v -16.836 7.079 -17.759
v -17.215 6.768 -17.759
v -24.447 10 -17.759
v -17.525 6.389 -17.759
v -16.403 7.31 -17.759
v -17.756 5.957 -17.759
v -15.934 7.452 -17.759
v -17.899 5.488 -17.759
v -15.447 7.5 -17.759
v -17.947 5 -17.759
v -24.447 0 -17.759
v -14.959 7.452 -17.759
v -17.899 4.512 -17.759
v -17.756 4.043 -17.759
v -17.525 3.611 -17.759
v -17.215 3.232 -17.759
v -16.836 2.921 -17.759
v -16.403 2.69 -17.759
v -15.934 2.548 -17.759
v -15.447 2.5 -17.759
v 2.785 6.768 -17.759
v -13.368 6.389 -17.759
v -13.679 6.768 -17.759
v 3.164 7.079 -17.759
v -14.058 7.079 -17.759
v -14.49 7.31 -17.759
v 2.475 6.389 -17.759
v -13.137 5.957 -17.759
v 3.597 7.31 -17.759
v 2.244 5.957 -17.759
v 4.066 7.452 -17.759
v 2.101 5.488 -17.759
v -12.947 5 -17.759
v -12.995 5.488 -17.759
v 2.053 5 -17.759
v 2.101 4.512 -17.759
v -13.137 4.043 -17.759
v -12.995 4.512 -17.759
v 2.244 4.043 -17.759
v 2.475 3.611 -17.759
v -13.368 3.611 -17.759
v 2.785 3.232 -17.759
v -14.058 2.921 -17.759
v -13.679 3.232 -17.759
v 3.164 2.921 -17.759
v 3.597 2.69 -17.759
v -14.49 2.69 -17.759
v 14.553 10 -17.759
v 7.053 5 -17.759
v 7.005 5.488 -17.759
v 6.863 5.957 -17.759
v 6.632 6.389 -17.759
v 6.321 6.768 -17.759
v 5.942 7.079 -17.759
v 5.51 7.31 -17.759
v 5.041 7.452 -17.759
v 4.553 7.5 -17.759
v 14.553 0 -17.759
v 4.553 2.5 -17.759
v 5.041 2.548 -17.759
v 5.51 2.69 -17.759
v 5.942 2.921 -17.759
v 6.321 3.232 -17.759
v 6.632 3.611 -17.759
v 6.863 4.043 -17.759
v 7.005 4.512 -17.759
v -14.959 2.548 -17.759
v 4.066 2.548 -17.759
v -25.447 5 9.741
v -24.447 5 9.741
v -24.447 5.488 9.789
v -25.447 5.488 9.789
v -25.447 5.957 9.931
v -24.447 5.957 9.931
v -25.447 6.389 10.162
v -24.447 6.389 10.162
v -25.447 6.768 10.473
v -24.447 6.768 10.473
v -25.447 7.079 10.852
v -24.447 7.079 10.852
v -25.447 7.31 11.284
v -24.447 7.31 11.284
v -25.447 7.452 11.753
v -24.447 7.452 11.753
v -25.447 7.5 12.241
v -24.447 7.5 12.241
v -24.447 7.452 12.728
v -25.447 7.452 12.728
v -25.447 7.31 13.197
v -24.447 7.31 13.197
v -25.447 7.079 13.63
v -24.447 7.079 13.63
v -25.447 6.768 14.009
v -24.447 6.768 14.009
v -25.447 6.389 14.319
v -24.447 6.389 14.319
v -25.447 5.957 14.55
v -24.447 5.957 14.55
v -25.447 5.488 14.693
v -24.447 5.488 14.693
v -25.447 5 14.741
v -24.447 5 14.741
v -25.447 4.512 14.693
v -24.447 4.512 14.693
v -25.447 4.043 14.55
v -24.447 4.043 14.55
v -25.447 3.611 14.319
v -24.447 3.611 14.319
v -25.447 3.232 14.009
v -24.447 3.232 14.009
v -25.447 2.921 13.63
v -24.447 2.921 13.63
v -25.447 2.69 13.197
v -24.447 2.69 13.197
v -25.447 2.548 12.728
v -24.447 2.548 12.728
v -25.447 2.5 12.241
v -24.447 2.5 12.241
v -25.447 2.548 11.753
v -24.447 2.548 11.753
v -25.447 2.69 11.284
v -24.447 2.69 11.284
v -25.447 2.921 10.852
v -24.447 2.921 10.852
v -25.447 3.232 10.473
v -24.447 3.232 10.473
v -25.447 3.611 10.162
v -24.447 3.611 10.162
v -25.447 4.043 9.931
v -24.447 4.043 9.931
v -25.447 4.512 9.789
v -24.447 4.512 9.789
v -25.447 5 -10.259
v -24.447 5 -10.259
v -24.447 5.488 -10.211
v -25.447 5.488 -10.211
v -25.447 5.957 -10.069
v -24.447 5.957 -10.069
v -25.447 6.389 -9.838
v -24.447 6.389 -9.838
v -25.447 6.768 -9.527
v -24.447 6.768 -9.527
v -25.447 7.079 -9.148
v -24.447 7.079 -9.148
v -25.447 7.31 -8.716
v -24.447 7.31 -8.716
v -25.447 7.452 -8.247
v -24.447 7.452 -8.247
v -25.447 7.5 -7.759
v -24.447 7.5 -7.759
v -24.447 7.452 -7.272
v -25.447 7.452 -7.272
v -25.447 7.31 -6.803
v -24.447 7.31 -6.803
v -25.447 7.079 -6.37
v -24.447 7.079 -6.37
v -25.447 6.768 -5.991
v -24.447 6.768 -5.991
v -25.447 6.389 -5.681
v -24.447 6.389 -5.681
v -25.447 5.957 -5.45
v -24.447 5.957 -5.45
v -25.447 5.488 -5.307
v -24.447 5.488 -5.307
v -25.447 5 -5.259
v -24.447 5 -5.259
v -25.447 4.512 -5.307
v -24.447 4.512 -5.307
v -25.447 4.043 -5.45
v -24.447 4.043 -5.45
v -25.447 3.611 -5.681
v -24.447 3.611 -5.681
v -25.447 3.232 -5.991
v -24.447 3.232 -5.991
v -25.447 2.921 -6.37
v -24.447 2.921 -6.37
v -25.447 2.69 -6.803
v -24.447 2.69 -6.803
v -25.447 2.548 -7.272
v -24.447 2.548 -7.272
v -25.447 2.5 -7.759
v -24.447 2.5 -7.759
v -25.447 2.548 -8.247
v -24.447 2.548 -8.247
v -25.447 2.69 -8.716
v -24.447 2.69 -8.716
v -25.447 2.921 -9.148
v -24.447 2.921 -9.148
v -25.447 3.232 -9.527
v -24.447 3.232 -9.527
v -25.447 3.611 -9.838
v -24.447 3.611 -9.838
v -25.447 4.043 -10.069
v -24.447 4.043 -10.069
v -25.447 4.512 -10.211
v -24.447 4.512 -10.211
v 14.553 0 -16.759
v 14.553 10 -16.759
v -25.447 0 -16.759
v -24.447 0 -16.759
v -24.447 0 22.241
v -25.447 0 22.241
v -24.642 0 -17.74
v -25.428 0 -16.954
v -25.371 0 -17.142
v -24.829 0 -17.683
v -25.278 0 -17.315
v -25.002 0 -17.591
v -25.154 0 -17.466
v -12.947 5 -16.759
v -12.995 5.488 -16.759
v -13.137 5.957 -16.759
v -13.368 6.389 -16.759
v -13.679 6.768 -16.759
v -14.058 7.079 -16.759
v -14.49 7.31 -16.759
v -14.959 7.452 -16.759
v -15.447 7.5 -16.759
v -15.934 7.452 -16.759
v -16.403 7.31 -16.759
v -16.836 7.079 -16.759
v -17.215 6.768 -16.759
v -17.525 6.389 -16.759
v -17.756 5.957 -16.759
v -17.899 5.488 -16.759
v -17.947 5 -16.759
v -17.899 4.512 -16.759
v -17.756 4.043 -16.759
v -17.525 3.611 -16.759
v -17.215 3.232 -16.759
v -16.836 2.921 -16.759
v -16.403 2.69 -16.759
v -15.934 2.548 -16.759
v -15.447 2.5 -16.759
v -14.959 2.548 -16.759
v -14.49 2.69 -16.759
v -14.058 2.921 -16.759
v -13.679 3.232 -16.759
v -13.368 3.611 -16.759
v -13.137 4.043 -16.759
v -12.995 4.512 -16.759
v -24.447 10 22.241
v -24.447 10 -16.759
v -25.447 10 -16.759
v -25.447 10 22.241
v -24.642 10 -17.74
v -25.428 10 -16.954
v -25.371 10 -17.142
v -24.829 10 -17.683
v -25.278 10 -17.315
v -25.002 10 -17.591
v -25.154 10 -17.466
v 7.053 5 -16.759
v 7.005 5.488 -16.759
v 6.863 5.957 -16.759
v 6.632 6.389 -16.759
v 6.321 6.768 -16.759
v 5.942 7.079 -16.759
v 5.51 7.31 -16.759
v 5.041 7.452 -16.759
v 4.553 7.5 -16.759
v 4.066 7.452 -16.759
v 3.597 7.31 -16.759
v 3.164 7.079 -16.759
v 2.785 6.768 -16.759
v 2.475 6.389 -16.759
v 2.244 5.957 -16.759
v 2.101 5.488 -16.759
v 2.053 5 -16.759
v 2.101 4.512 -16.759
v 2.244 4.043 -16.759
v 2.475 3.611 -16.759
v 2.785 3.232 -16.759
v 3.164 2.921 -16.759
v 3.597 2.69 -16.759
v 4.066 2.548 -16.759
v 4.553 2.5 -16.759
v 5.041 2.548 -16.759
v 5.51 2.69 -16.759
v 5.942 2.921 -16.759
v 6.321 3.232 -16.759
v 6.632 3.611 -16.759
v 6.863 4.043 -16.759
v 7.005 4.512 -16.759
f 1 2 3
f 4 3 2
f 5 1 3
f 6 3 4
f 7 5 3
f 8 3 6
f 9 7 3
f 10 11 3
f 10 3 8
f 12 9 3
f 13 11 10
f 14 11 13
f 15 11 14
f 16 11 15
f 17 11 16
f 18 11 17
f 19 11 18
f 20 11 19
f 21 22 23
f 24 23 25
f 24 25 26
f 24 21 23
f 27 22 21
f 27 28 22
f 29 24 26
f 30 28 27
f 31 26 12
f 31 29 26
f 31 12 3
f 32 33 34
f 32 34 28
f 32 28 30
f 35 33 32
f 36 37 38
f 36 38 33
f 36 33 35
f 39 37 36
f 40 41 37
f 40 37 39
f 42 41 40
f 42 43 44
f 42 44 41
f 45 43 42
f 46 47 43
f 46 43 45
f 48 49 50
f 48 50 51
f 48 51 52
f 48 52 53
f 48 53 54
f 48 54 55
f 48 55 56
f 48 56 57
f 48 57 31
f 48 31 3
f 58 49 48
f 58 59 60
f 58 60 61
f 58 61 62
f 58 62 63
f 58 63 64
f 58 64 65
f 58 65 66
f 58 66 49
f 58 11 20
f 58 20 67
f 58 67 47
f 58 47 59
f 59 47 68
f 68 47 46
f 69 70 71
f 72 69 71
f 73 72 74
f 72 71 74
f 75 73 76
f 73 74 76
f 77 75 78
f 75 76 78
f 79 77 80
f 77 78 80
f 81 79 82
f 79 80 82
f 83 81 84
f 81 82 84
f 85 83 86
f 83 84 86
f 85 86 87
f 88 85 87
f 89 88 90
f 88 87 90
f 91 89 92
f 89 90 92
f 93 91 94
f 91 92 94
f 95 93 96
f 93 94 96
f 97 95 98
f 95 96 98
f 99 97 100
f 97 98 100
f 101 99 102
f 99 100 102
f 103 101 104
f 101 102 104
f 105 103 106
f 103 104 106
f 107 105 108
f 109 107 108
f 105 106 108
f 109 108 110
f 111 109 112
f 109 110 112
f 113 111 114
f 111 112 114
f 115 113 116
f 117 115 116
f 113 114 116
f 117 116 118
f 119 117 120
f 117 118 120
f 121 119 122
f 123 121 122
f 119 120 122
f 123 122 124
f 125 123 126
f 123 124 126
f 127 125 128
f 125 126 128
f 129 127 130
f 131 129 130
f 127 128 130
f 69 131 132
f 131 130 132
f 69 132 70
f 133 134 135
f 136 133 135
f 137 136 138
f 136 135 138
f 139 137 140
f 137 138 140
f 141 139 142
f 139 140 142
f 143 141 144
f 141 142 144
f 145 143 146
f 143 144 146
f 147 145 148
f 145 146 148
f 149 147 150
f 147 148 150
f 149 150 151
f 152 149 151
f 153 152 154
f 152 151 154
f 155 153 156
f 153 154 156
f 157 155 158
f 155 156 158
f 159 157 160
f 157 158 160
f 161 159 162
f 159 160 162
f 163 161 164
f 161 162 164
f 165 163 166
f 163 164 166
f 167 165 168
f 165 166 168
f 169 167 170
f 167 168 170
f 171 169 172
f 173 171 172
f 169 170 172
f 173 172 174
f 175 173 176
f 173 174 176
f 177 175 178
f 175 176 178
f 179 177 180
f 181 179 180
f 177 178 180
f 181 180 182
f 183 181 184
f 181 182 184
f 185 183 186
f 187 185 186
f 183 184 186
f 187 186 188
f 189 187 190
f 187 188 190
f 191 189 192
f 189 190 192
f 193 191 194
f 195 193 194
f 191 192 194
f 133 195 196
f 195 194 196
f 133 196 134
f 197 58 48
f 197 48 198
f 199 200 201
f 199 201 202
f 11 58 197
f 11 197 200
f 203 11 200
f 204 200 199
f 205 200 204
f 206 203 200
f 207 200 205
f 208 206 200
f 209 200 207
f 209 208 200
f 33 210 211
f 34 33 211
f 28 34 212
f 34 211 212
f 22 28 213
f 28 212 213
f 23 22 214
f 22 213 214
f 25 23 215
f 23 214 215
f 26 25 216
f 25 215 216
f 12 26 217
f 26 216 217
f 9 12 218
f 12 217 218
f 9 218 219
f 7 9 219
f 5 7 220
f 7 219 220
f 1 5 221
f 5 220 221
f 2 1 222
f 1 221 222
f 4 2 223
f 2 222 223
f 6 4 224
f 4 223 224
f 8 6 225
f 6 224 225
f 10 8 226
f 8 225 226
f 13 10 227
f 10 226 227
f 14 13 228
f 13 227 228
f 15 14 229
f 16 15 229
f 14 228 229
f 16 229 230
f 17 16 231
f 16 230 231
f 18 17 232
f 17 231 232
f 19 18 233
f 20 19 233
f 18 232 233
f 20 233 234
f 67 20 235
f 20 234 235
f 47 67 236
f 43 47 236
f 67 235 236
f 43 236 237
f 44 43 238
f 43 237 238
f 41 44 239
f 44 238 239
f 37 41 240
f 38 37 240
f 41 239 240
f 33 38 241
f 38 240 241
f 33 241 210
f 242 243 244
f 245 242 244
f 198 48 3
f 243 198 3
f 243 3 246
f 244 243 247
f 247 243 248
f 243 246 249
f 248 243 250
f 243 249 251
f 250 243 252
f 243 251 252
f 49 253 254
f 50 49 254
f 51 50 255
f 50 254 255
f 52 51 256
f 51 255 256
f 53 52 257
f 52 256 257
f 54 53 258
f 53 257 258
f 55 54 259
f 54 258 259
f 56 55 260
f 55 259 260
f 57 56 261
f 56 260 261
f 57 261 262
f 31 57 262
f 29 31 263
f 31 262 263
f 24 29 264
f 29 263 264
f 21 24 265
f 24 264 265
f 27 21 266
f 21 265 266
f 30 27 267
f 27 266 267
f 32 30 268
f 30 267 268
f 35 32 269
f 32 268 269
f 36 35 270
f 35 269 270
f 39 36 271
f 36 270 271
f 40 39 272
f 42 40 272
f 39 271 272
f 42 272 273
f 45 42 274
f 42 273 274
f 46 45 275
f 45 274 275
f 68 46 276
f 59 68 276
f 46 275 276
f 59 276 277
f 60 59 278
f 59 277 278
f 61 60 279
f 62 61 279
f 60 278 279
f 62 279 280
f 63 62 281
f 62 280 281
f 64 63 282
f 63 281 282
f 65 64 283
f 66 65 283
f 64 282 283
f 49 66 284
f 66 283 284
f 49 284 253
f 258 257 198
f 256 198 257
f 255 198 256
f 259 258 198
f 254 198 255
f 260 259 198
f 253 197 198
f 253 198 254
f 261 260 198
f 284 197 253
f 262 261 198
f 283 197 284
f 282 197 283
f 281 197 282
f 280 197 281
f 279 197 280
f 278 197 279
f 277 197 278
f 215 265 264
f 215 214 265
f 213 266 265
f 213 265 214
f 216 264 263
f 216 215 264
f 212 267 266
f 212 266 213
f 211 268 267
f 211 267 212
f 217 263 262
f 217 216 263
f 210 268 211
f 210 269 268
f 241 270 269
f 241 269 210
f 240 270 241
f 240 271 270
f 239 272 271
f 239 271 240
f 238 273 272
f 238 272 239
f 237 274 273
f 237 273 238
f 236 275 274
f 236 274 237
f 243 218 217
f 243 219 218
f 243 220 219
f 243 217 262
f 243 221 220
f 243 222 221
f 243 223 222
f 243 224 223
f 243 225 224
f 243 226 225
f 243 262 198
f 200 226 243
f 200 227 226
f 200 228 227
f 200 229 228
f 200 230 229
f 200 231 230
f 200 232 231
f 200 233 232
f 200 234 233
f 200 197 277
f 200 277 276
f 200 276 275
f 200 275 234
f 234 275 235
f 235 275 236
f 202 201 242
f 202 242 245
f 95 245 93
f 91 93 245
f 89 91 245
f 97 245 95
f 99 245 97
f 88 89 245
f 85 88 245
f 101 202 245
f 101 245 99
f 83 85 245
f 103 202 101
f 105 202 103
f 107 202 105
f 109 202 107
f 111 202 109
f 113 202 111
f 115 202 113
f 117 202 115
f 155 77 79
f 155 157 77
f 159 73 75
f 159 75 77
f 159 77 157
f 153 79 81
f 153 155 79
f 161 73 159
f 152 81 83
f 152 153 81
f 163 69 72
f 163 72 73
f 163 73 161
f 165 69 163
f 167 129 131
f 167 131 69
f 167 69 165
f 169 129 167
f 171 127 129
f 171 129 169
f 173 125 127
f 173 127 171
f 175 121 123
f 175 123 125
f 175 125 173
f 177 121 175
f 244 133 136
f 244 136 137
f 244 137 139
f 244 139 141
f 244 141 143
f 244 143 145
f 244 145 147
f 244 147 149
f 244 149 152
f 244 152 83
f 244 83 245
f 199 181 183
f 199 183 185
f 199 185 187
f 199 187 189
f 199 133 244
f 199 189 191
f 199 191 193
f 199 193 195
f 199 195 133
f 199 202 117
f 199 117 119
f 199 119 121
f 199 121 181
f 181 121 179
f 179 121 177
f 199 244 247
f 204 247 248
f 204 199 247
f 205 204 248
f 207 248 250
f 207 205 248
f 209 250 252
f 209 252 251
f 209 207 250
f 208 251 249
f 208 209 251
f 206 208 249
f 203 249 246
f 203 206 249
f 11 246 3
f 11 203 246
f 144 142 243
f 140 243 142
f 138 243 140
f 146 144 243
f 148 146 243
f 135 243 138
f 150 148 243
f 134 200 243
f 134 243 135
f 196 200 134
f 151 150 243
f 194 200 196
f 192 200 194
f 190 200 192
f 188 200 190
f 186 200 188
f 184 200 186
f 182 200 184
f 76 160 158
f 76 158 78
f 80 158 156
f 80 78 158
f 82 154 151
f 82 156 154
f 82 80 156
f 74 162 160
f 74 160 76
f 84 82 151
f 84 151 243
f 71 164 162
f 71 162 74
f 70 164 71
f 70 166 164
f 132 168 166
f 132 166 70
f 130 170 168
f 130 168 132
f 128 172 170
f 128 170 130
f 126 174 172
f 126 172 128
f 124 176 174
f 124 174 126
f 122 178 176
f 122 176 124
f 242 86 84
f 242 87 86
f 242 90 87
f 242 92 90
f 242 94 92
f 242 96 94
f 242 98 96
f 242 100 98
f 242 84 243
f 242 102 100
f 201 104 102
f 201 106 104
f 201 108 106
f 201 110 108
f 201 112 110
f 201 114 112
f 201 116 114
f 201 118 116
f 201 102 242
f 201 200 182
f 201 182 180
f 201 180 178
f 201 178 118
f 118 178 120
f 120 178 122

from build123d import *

# Parameters (mm, degrees)
SALIENTE_EXTRUIR1_DEPTH = 10
CROQUIS2_R              = 2.5
CORTAR_EXTRUIR1_DEPTH   = 1
CROQUIS3_R              = 2.5
CORTAR_EXTRUIR2_DEPTH   = 1


with BuildPart() as part:
    # Croquis1 → Saliente-Extruir1 (new body)
    with BuildSketch(Plane(origin=(0, 0, 0), x_dir=(1, 0, 0), z_dir=(0, 1, 0))):
        with BuildLine():
            ThreePointArc((-25.446754953, 16.759256359), (-25.153861734, 17.46636314), (-24.446754953, 17.759256359))
            Line((-24.446754953, 17.759256359), (14.553245047, 17.759256359))
            Line((14.553245047, 17.759256359), (14.553245047, 16.759256359))
            Line((14.553245047, 16.759256359), (-24.446754953, 16.759256359))
            Line((-24.446754953, 16.759256359), (-24.446754953, -22.240743641))
            Line((-24.446754953, -22.240743641), (-25.446754953, -22.240743641))
            Line((-25.446754953, -22.240743641), (-25.446754953, 16.759256359))
        make_face()
    extrude(amount=SALIENTE_EXTRUIR1_DEPTH)

    # Croquis2 → Cortar-Extruir1 (cut)
    with BuildSketch(Plane.XY.offset(-16.759256359)):
        with Locations((4.553245047, 5)):
            Circle(CROQUIS2_R)
        with Locations((-15.446754953, 5)):
            Circle(CROQUIS2_R)
    extrude(amount=-CORTAR_EXTRUIR1_DEPTH, mode=Mode.SUBTRACT)

    # Croquis3 → Cortar-Extruir2 (cut)
    with BuildSketch(Plane(origin=(-24.446754953, 0, 0), x_dir=(0, 0, -1), z_dir=(1, 0, 0))):
        with Locations((-12.240743641, 5)):
            Circle(CROQUIS3_R)
        with Locations((7.759256359, 5)):
            Circle(CROQUIS3_R)
    extrude(amount=-CORTAR_EXTRUIR2_DEPTH, mode=Mode.SUBTRACT)


solid = part.part
